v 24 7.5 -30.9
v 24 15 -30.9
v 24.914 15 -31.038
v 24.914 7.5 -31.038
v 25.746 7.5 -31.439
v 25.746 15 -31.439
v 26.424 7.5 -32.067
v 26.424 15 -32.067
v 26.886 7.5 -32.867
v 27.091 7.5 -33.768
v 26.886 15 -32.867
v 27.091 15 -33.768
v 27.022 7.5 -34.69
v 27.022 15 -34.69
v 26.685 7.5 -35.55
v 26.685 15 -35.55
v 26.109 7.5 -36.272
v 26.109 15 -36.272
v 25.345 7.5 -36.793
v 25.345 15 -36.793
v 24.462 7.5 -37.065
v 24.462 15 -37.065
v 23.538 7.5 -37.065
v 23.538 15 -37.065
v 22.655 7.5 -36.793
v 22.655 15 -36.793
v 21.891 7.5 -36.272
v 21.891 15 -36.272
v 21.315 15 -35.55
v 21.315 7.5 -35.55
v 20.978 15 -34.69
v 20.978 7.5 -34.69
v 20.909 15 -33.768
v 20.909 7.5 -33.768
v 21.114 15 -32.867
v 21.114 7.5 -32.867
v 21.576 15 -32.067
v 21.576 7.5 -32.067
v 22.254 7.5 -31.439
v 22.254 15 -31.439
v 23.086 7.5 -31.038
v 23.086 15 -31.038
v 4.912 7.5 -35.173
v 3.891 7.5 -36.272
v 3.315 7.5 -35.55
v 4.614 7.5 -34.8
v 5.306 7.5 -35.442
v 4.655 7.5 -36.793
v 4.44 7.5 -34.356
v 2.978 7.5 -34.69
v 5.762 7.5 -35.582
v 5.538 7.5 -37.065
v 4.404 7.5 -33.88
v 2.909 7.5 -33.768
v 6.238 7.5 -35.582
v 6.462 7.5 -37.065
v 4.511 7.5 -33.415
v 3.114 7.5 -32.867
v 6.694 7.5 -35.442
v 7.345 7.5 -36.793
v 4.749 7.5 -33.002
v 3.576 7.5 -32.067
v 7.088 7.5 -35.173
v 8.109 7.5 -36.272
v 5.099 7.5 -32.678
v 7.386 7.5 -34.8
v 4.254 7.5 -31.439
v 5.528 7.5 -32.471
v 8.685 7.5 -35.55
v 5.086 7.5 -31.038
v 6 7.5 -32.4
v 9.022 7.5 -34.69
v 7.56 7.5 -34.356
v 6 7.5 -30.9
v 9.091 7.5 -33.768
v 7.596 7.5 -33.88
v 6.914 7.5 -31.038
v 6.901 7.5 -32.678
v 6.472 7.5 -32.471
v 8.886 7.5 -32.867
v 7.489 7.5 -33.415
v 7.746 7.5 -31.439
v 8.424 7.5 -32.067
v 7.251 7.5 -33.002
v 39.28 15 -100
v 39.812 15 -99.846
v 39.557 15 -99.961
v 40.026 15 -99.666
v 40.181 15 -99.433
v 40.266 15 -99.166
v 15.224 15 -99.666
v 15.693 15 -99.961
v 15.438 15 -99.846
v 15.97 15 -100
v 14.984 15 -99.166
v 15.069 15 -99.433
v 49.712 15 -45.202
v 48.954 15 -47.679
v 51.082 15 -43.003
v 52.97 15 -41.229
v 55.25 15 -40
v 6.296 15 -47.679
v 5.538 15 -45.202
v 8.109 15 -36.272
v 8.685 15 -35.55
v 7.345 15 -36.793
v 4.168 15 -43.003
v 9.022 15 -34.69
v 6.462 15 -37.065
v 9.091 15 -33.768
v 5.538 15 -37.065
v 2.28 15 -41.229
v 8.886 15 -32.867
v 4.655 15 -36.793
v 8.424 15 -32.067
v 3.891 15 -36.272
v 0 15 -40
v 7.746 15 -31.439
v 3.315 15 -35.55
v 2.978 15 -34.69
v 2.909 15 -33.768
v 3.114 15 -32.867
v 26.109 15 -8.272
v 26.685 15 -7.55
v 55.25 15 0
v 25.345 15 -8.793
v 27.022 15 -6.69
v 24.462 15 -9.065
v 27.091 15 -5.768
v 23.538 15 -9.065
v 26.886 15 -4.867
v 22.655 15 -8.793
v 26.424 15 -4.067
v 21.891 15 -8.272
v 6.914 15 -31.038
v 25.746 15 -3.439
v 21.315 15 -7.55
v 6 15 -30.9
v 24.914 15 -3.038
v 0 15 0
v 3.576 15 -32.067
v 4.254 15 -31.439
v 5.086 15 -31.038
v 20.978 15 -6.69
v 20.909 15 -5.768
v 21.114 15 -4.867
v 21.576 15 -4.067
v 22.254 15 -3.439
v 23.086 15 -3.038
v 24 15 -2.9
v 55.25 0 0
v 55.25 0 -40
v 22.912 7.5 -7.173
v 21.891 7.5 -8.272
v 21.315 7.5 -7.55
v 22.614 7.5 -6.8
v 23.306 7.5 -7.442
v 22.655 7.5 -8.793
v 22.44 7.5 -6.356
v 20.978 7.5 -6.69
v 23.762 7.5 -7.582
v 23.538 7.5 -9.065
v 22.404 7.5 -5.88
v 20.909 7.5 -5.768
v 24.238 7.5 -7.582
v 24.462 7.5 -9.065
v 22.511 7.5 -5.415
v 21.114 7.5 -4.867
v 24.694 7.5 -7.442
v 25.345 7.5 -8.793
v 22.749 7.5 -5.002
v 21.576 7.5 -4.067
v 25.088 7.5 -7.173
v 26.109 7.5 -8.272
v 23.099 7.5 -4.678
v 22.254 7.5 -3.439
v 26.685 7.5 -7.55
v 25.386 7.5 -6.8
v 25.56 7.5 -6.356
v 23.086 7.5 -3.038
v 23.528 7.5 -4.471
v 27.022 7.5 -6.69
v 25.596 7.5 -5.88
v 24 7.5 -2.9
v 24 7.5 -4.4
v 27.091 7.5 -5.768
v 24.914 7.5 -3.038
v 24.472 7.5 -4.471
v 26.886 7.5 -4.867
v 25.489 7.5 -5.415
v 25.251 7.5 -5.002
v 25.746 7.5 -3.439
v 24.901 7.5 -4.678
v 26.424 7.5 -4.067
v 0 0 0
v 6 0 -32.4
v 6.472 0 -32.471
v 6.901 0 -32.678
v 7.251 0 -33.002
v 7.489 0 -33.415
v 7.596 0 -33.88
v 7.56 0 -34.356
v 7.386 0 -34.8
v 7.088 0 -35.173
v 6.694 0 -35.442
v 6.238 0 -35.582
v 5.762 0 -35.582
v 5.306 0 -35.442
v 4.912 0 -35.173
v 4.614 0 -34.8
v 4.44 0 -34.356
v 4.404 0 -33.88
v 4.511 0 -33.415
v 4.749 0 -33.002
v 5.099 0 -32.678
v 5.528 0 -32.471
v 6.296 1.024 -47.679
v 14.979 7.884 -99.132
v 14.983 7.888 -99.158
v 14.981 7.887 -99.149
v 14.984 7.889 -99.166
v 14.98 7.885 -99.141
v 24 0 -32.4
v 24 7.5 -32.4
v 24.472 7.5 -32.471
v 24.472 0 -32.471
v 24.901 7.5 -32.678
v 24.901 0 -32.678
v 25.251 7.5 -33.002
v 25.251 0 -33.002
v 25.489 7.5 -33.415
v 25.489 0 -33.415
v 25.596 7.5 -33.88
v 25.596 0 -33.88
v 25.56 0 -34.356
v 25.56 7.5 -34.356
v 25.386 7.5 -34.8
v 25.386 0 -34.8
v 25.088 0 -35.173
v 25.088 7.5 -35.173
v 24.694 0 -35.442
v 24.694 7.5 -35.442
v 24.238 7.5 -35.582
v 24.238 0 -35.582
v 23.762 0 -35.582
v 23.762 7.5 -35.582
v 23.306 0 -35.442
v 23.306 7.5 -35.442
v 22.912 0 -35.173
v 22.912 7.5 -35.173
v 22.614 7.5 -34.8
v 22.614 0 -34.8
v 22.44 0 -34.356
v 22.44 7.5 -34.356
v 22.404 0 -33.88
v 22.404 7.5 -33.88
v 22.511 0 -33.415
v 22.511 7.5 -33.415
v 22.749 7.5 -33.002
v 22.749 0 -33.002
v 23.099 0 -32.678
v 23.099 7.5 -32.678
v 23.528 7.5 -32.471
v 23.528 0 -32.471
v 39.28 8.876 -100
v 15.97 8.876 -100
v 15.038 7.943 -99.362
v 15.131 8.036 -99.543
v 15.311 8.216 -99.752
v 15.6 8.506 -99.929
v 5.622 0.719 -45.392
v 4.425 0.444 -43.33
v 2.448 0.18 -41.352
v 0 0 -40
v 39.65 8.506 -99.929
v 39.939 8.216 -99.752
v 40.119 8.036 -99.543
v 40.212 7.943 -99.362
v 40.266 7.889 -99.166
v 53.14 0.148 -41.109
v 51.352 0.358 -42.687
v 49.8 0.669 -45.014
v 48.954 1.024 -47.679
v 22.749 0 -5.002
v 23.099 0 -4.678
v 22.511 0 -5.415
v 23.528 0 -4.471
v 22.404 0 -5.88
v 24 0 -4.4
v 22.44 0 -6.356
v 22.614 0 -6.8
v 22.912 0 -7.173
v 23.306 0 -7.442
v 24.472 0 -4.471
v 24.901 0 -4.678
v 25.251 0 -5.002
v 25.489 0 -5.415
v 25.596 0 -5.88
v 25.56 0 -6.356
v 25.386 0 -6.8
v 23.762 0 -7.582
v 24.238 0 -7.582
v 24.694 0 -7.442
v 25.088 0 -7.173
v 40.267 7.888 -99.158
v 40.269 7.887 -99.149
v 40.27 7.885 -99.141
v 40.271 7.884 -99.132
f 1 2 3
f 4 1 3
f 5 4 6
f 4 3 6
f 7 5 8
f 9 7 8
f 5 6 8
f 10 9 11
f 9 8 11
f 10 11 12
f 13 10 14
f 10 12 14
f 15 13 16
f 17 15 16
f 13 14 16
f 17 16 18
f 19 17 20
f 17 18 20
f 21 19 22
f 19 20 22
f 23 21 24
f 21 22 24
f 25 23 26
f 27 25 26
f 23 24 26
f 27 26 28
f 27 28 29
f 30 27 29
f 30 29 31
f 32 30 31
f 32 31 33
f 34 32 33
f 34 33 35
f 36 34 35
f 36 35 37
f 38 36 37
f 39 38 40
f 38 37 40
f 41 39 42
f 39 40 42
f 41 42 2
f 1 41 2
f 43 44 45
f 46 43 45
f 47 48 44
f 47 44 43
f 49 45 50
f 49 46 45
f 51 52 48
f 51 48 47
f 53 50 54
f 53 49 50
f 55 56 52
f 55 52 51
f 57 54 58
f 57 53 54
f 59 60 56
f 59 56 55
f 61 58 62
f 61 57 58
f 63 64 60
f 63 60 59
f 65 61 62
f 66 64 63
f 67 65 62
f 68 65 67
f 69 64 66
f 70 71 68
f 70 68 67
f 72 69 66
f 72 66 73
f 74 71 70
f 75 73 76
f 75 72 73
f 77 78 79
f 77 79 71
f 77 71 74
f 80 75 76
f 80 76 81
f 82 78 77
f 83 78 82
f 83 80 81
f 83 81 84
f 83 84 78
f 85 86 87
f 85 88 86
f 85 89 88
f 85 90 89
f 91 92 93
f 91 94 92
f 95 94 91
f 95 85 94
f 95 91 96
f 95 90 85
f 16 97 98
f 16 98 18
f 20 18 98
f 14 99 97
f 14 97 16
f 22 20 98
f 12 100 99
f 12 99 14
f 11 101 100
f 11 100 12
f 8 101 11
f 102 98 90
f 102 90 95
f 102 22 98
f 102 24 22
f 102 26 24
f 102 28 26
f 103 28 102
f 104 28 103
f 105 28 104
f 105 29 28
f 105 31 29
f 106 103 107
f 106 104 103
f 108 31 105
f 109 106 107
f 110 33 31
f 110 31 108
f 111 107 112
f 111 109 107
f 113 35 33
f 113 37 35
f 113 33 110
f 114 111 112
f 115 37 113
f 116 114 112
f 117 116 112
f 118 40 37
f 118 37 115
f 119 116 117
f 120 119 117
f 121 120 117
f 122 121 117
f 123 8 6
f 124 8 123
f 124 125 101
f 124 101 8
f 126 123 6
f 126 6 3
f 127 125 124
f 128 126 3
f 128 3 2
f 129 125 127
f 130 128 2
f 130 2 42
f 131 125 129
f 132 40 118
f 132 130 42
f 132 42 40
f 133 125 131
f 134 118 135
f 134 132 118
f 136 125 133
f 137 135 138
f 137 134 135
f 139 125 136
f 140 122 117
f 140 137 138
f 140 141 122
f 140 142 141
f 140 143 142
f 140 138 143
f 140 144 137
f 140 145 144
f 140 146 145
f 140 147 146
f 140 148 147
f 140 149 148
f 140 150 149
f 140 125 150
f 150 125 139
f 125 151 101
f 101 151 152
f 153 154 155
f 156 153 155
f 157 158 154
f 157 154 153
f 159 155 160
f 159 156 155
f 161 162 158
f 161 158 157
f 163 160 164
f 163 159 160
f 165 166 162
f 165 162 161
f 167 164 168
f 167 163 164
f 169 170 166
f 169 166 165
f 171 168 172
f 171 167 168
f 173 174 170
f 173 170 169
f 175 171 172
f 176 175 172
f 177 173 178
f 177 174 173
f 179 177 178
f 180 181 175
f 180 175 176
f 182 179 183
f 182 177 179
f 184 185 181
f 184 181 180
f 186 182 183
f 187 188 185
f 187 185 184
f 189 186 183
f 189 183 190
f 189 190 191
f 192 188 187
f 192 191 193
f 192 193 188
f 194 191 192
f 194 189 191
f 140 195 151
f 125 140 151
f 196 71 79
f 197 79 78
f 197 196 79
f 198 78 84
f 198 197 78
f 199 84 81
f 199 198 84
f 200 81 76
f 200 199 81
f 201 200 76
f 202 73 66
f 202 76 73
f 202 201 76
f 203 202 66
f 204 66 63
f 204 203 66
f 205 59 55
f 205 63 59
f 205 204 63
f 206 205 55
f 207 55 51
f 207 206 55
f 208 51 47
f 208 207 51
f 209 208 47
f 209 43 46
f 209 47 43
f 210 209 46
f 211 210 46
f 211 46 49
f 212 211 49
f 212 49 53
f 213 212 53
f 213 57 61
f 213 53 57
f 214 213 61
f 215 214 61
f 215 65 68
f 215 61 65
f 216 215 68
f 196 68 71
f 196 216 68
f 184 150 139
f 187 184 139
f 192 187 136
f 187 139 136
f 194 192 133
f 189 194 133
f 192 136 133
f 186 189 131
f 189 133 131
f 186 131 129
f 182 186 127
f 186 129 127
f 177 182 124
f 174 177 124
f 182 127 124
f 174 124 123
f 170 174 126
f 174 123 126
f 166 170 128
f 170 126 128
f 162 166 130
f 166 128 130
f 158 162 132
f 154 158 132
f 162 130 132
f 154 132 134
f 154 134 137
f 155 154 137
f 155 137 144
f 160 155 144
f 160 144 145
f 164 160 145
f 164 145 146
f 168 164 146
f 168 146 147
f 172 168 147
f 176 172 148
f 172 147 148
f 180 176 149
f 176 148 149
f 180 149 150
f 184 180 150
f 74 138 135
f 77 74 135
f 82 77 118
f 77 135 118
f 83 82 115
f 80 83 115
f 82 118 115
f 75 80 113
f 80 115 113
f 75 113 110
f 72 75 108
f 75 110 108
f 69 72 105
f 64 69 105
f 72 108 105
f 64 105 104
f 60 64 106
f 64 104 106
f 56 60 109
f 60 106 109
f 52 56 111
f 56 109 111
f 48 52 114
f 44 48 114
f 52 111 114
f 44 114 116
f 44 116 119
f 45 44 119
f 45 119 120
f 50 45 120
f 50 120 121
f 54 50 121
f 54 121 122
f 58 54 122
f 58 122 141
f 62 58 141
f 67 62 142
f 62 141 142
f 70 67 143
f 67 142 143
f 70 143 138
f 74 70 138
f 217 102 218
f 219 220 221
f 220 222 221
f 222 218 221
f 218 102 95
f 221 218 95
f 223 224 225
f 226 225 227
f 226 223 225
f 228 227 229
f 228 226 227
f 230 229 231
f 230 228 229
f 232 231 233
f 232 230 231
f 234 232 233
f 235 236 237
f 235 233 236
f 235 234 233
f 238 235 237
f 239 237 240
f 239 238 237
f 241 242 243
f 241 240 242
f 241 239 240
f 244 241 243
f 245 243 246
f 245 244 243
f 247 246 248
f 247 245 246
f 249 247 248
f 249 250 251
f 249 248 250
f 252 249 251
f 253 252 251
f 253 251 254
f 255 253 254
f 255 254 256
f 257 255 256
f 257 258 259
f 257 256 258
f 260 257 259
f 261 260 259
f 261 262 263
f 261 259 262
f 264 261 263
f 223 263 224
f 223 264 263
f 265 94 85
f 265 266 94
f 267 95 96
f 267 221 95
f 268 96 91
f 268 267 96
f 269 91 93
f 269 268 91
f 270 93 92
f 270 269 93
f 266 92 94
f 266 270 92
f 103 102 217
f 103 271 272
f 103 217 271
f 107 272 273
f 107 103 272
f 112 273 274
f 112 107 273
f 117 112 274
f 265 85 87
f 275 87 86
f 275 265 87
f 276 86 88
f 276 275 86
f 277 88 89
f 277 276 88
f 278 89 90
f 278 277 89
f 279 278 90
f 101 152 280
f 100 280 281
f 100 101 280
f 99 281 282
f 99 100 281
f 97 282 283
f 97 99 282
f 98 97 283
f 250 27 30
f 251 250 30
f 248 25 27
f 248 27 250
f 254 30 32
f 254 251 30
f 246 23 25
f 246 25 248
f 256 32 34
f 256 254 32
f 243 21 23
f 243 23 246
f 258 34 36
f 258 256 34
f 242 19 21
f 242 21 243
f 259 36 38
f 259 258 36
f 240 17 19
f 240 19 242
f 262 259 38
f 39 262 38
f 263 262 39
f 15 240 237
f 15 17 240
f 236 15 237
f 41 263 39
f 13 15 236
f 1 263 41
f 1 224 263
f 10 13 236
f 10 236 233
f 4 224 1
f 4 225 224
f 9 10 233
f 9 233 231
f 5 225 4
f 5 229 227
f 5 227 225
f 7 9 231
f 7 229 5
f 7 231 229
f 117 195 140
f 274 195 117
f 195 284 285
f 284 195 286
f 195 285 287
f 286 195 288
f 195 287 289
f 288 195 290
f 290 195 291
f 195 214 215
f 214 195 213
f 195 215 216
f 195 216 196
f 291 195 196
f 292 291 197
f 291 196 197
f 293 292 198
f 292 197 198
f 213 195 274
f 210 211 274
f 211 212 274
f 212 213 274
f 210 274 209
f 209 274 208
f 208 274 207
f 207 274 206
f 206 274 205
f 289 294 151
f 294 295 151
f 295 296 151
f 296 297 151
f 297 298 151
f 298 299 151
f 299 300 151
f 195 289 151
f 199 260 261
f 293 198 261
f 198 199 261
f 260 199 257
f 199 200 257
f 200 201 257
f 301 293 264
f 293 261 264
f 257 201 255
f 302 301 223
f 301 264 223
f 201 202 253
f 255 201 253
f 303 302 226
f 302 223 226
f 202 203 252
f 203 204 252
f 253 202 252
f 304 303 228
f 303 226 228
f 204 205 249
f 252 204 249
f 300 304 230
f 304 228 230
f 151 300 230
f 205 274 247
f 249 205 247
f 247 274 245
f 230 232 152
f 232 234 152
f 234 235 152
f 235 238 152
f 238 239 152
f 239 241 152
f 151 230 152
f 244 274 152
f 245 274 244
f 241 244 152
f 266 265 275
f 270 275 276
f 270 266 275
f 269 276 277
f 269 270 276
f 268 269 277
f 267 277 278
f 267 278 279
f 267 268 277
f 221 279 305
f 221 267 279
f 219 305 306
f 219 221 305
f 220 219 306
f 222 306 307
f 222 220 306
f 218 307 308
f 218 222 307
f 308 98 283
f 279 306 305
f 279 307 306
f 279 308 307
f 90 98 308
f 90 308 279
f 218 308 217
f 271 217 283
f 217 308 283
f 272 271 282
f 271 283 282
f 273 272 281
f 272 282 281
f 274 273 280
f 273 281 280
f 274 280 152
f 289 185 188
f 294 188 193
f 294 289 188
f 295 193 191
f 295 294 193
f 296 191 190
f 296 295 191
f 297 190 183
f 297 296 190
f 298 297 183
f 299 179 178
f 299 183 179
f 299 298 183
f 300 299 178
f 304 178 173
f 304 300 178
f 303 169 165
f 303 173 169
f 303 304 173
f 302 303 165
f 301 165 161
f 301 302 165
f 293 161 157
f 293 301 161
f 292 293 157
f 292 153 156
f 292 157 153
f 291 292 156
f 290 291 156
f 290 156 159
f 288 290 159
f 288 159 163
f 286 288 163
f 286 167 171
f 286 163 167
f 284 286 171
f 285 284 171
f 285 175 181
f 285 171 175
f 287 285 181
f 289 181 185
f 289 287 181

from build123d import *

# Parameters (mm, degrees)
SKETCH1_W           = 55.25
SKETCH1_H           = 100
SKETCH1_R           = 1.6
BOSS_EXTRUDE1_DEPTH = 15
SKETCH2_R           = 3.1
CUT_EXTRUDE1_DEPTH  = 7.5
CUT_EXTRUDE3_REACH  = 117.228
CUT_EXTRUDE2_REACH  = 117.228
FILLET3_R           = 10
FILLET4_R           = 1


with BuildPart() as part:
    # Sketch1 → Boss-Extrude1 (new body)
    with BuildSketch(Plane(origin=(0, 0, 0), x_dir=(1, 0, 0), z_dir=(0, 1, 0))):
        with Locations((27.625, 50)):
            Rectangle(SKETCH1_W, SKETCH1_H)
        with Locations(Location((24, 6, 0), (0, 0, 270))):
            Circle(SKETCH1_R, mode=Mode.SUBTRACT)
        with Locations(Location((6, 34, 0), (0, 0, 270))):
            Circle(SKETCH1_R, mode=Mode.SUBTRACT)
        with Locations(Location((24, 34, 0), (0, 0, 270))):
            Circle(SKETCH1_R, mode=Mode.SUBTRACT)
    extrude(amount=BOSS_EXTRUDE1_DEPTH)

    # Sketch2 → Cut-Extrude1 (cut)
    with BuildSketch(Plane(origin=(0, 15, 0), x_dir=(1, 0, 0), z_dir=(0, 1, 0))):
        with Locations(Location((24, 34, 0), (0, 0, 270))):
            Circle(SKETCH2_R)
        with Locations(Location((24, 6, 0), (0, 0, 270))):
            Circle(SKETCH2_R)
        with Locations(Location((6, 34, 0), (0, 0, 270))):
            Circle(SKETCH2_R)
    extrude(amount=-CUT_EXTRUDE1_DEPTH, mode=Mode.SUBTRACT)

    # Sketch5 → Cut-Extrude3 (cut, up to next)
    with BuildSketch(Plane(origin=(55.25, 0, 0), x_dir=(0, 0, -1), z_dir=(1, 0, 0)), mode=Mode.PRIVATE) as cut_extrude3_sk1:
        Polygon((40, 0), (100, 8), (100, 0), align=None)
    cut_extrude3_tool1 = extrude(cut_extrude3_sk1.sketch, amount=-CUT_EXTRUDE3_REACH, mode=Mode.PRIVATE) & part.part
    add(cut_extrude3_tool1.solids().sort_by_distance((55.25, 2.666667, -80))[0], mode=Mode.SUBTRACT)

    # Sketch3 → Cut-Extrude2 (cut, up to next)
    with BuildSketch(Plane(origin=(0, 15, 0), x_dir=(1, 0, 0), z_dir=(0, 1, 0)), mode=Mode.PRIVATE) as cut_extrude2_sk1:
        Polygon((40.125, 100), (55.25, 100), (55.25, 40), (50.25, 40), align=None)
    cut_extrude2_tool1 = extrude(cut_extrude2_sk1.sketch, amount=-CUT_EXTRUDE2_REACH, mode=Mode.PRIVATE) & part.part
    # Sketch3 → Cut-Extrude2 (cut, up to next)
    with BuildSketch(Plane(origin=(0, 15, 0), x_dir=(1, 0, 0), z_dir=(0, 1, 0)), mode=Mode.PRIVATE) as cut_extrude2_sk2:
        Polygon((15.125, 100), (0, 100), (0, 40), (5, 40), align=None)
    cut_extrude2_tool2 = extrude(cut_extrude2_sk2.sketch, amount=-CUT_EXTRUDE2_REACH, mode=Mode.PRIVATE) & part.part
    add(cut_extrude2_tool1.solids().sort_by_distance((49.794255, 15, -75.031056))[0], mode=Mode.SUBTRACT)
    add(cut_extrude2_tool2.solids().sort_by_distance((5.455745, 15, -75.031056))[0], mode=Mode.SUBTRACT)

    # Fillet3
    # the kernel refuses this fillet: 10 mm, written as the material it adds along each edge
    with BuildSketch(Plane(origin=(5, 15, -40), x_dir=(-1, 0, 0), z_dir=(0, -1, 0))) as fillet3_piece_1_section:
        with BuildLine():
            CenterArc((8.564743476, 9.343051105), FILLET3_R, 189.578422919, 59.537746257)
            Line((-1.295844232, 7.679076929), (-1.493055986, 7.645797446))
            Line((-1.493055986, 7.645797446), (-0.197211754, -0.033279484))
            Line((-0.197211754, -0.033279484), (0, -0.2))
            ThreePointArc((0, -0.2), (2.5, -0.2), (4.92870513, -0.186861022))
            Line((4.92870513, -0.186861022), (5, 0))
        make_face()
    fillet3_piece_1 = extrude(amount=15, mode=Mode.PRIVATE)
    fillet3_piece_1 = split(fillet3_piece_1, bisect_by=Plane(origin=(4.040002964, 0.373004519, -42.797533893), z_dir=(0, 0.9912279006826347, 0.13216372009101796)), keep=Keep.TOP, mode=Mode.PRIVATE)
    add(fillet3_piece_1)
    with BuildSketch(Plane(origin=(50.25, 15, -40), x_dir=(1, 0, 0), z_dir=(0, -1, 0))) as fillet3_piece_2_section:
        with BuildLine():
            CenterArc((8.564743476, -9.343051105), FILLET3_R, 110.883830823, 59.537746257)
            Line((-1.295844232, -7.679076929), (-1.493055986, -7.645797446))
            Line((-1.493055986, -7.645797446), (-0.197211754, 0.033279484))
            Line((-0.197211754, 0.033279484), (0, 0.2))
            ThreePointArc((0, 0.2), (2.5, 0.2), (4.92870513, 0.186861022))
            Line((4.92870513, 0.186861022), (5, 0))
        make_face()
    fillet3_piece_2 = extrude(amount=15, mode=Mode.PRIVATE)
    fillet3_piece_2 = split(fillet3_piece_2, bisect_by=Plane(origin=(51.209997036, 0.373004519, -42.797533893), z_dir=(0, 0.9912279006826347, 0.13216372009101796)), keep=Keep.TOP, mode=Mode.PRIVATE)
    add(fillet3_piece_2)

    # Fillet4
    fillet4_edges = [part.edges().sort_by_distance(p)[0] for p in [
        (27.625, 8, -100),
        (15.125, 11.5, -100),
        (40.125, 11.5, -100),
    ]]
    fillet(fillet4_edges, radius=FILLET4_R)


solid = part.part
